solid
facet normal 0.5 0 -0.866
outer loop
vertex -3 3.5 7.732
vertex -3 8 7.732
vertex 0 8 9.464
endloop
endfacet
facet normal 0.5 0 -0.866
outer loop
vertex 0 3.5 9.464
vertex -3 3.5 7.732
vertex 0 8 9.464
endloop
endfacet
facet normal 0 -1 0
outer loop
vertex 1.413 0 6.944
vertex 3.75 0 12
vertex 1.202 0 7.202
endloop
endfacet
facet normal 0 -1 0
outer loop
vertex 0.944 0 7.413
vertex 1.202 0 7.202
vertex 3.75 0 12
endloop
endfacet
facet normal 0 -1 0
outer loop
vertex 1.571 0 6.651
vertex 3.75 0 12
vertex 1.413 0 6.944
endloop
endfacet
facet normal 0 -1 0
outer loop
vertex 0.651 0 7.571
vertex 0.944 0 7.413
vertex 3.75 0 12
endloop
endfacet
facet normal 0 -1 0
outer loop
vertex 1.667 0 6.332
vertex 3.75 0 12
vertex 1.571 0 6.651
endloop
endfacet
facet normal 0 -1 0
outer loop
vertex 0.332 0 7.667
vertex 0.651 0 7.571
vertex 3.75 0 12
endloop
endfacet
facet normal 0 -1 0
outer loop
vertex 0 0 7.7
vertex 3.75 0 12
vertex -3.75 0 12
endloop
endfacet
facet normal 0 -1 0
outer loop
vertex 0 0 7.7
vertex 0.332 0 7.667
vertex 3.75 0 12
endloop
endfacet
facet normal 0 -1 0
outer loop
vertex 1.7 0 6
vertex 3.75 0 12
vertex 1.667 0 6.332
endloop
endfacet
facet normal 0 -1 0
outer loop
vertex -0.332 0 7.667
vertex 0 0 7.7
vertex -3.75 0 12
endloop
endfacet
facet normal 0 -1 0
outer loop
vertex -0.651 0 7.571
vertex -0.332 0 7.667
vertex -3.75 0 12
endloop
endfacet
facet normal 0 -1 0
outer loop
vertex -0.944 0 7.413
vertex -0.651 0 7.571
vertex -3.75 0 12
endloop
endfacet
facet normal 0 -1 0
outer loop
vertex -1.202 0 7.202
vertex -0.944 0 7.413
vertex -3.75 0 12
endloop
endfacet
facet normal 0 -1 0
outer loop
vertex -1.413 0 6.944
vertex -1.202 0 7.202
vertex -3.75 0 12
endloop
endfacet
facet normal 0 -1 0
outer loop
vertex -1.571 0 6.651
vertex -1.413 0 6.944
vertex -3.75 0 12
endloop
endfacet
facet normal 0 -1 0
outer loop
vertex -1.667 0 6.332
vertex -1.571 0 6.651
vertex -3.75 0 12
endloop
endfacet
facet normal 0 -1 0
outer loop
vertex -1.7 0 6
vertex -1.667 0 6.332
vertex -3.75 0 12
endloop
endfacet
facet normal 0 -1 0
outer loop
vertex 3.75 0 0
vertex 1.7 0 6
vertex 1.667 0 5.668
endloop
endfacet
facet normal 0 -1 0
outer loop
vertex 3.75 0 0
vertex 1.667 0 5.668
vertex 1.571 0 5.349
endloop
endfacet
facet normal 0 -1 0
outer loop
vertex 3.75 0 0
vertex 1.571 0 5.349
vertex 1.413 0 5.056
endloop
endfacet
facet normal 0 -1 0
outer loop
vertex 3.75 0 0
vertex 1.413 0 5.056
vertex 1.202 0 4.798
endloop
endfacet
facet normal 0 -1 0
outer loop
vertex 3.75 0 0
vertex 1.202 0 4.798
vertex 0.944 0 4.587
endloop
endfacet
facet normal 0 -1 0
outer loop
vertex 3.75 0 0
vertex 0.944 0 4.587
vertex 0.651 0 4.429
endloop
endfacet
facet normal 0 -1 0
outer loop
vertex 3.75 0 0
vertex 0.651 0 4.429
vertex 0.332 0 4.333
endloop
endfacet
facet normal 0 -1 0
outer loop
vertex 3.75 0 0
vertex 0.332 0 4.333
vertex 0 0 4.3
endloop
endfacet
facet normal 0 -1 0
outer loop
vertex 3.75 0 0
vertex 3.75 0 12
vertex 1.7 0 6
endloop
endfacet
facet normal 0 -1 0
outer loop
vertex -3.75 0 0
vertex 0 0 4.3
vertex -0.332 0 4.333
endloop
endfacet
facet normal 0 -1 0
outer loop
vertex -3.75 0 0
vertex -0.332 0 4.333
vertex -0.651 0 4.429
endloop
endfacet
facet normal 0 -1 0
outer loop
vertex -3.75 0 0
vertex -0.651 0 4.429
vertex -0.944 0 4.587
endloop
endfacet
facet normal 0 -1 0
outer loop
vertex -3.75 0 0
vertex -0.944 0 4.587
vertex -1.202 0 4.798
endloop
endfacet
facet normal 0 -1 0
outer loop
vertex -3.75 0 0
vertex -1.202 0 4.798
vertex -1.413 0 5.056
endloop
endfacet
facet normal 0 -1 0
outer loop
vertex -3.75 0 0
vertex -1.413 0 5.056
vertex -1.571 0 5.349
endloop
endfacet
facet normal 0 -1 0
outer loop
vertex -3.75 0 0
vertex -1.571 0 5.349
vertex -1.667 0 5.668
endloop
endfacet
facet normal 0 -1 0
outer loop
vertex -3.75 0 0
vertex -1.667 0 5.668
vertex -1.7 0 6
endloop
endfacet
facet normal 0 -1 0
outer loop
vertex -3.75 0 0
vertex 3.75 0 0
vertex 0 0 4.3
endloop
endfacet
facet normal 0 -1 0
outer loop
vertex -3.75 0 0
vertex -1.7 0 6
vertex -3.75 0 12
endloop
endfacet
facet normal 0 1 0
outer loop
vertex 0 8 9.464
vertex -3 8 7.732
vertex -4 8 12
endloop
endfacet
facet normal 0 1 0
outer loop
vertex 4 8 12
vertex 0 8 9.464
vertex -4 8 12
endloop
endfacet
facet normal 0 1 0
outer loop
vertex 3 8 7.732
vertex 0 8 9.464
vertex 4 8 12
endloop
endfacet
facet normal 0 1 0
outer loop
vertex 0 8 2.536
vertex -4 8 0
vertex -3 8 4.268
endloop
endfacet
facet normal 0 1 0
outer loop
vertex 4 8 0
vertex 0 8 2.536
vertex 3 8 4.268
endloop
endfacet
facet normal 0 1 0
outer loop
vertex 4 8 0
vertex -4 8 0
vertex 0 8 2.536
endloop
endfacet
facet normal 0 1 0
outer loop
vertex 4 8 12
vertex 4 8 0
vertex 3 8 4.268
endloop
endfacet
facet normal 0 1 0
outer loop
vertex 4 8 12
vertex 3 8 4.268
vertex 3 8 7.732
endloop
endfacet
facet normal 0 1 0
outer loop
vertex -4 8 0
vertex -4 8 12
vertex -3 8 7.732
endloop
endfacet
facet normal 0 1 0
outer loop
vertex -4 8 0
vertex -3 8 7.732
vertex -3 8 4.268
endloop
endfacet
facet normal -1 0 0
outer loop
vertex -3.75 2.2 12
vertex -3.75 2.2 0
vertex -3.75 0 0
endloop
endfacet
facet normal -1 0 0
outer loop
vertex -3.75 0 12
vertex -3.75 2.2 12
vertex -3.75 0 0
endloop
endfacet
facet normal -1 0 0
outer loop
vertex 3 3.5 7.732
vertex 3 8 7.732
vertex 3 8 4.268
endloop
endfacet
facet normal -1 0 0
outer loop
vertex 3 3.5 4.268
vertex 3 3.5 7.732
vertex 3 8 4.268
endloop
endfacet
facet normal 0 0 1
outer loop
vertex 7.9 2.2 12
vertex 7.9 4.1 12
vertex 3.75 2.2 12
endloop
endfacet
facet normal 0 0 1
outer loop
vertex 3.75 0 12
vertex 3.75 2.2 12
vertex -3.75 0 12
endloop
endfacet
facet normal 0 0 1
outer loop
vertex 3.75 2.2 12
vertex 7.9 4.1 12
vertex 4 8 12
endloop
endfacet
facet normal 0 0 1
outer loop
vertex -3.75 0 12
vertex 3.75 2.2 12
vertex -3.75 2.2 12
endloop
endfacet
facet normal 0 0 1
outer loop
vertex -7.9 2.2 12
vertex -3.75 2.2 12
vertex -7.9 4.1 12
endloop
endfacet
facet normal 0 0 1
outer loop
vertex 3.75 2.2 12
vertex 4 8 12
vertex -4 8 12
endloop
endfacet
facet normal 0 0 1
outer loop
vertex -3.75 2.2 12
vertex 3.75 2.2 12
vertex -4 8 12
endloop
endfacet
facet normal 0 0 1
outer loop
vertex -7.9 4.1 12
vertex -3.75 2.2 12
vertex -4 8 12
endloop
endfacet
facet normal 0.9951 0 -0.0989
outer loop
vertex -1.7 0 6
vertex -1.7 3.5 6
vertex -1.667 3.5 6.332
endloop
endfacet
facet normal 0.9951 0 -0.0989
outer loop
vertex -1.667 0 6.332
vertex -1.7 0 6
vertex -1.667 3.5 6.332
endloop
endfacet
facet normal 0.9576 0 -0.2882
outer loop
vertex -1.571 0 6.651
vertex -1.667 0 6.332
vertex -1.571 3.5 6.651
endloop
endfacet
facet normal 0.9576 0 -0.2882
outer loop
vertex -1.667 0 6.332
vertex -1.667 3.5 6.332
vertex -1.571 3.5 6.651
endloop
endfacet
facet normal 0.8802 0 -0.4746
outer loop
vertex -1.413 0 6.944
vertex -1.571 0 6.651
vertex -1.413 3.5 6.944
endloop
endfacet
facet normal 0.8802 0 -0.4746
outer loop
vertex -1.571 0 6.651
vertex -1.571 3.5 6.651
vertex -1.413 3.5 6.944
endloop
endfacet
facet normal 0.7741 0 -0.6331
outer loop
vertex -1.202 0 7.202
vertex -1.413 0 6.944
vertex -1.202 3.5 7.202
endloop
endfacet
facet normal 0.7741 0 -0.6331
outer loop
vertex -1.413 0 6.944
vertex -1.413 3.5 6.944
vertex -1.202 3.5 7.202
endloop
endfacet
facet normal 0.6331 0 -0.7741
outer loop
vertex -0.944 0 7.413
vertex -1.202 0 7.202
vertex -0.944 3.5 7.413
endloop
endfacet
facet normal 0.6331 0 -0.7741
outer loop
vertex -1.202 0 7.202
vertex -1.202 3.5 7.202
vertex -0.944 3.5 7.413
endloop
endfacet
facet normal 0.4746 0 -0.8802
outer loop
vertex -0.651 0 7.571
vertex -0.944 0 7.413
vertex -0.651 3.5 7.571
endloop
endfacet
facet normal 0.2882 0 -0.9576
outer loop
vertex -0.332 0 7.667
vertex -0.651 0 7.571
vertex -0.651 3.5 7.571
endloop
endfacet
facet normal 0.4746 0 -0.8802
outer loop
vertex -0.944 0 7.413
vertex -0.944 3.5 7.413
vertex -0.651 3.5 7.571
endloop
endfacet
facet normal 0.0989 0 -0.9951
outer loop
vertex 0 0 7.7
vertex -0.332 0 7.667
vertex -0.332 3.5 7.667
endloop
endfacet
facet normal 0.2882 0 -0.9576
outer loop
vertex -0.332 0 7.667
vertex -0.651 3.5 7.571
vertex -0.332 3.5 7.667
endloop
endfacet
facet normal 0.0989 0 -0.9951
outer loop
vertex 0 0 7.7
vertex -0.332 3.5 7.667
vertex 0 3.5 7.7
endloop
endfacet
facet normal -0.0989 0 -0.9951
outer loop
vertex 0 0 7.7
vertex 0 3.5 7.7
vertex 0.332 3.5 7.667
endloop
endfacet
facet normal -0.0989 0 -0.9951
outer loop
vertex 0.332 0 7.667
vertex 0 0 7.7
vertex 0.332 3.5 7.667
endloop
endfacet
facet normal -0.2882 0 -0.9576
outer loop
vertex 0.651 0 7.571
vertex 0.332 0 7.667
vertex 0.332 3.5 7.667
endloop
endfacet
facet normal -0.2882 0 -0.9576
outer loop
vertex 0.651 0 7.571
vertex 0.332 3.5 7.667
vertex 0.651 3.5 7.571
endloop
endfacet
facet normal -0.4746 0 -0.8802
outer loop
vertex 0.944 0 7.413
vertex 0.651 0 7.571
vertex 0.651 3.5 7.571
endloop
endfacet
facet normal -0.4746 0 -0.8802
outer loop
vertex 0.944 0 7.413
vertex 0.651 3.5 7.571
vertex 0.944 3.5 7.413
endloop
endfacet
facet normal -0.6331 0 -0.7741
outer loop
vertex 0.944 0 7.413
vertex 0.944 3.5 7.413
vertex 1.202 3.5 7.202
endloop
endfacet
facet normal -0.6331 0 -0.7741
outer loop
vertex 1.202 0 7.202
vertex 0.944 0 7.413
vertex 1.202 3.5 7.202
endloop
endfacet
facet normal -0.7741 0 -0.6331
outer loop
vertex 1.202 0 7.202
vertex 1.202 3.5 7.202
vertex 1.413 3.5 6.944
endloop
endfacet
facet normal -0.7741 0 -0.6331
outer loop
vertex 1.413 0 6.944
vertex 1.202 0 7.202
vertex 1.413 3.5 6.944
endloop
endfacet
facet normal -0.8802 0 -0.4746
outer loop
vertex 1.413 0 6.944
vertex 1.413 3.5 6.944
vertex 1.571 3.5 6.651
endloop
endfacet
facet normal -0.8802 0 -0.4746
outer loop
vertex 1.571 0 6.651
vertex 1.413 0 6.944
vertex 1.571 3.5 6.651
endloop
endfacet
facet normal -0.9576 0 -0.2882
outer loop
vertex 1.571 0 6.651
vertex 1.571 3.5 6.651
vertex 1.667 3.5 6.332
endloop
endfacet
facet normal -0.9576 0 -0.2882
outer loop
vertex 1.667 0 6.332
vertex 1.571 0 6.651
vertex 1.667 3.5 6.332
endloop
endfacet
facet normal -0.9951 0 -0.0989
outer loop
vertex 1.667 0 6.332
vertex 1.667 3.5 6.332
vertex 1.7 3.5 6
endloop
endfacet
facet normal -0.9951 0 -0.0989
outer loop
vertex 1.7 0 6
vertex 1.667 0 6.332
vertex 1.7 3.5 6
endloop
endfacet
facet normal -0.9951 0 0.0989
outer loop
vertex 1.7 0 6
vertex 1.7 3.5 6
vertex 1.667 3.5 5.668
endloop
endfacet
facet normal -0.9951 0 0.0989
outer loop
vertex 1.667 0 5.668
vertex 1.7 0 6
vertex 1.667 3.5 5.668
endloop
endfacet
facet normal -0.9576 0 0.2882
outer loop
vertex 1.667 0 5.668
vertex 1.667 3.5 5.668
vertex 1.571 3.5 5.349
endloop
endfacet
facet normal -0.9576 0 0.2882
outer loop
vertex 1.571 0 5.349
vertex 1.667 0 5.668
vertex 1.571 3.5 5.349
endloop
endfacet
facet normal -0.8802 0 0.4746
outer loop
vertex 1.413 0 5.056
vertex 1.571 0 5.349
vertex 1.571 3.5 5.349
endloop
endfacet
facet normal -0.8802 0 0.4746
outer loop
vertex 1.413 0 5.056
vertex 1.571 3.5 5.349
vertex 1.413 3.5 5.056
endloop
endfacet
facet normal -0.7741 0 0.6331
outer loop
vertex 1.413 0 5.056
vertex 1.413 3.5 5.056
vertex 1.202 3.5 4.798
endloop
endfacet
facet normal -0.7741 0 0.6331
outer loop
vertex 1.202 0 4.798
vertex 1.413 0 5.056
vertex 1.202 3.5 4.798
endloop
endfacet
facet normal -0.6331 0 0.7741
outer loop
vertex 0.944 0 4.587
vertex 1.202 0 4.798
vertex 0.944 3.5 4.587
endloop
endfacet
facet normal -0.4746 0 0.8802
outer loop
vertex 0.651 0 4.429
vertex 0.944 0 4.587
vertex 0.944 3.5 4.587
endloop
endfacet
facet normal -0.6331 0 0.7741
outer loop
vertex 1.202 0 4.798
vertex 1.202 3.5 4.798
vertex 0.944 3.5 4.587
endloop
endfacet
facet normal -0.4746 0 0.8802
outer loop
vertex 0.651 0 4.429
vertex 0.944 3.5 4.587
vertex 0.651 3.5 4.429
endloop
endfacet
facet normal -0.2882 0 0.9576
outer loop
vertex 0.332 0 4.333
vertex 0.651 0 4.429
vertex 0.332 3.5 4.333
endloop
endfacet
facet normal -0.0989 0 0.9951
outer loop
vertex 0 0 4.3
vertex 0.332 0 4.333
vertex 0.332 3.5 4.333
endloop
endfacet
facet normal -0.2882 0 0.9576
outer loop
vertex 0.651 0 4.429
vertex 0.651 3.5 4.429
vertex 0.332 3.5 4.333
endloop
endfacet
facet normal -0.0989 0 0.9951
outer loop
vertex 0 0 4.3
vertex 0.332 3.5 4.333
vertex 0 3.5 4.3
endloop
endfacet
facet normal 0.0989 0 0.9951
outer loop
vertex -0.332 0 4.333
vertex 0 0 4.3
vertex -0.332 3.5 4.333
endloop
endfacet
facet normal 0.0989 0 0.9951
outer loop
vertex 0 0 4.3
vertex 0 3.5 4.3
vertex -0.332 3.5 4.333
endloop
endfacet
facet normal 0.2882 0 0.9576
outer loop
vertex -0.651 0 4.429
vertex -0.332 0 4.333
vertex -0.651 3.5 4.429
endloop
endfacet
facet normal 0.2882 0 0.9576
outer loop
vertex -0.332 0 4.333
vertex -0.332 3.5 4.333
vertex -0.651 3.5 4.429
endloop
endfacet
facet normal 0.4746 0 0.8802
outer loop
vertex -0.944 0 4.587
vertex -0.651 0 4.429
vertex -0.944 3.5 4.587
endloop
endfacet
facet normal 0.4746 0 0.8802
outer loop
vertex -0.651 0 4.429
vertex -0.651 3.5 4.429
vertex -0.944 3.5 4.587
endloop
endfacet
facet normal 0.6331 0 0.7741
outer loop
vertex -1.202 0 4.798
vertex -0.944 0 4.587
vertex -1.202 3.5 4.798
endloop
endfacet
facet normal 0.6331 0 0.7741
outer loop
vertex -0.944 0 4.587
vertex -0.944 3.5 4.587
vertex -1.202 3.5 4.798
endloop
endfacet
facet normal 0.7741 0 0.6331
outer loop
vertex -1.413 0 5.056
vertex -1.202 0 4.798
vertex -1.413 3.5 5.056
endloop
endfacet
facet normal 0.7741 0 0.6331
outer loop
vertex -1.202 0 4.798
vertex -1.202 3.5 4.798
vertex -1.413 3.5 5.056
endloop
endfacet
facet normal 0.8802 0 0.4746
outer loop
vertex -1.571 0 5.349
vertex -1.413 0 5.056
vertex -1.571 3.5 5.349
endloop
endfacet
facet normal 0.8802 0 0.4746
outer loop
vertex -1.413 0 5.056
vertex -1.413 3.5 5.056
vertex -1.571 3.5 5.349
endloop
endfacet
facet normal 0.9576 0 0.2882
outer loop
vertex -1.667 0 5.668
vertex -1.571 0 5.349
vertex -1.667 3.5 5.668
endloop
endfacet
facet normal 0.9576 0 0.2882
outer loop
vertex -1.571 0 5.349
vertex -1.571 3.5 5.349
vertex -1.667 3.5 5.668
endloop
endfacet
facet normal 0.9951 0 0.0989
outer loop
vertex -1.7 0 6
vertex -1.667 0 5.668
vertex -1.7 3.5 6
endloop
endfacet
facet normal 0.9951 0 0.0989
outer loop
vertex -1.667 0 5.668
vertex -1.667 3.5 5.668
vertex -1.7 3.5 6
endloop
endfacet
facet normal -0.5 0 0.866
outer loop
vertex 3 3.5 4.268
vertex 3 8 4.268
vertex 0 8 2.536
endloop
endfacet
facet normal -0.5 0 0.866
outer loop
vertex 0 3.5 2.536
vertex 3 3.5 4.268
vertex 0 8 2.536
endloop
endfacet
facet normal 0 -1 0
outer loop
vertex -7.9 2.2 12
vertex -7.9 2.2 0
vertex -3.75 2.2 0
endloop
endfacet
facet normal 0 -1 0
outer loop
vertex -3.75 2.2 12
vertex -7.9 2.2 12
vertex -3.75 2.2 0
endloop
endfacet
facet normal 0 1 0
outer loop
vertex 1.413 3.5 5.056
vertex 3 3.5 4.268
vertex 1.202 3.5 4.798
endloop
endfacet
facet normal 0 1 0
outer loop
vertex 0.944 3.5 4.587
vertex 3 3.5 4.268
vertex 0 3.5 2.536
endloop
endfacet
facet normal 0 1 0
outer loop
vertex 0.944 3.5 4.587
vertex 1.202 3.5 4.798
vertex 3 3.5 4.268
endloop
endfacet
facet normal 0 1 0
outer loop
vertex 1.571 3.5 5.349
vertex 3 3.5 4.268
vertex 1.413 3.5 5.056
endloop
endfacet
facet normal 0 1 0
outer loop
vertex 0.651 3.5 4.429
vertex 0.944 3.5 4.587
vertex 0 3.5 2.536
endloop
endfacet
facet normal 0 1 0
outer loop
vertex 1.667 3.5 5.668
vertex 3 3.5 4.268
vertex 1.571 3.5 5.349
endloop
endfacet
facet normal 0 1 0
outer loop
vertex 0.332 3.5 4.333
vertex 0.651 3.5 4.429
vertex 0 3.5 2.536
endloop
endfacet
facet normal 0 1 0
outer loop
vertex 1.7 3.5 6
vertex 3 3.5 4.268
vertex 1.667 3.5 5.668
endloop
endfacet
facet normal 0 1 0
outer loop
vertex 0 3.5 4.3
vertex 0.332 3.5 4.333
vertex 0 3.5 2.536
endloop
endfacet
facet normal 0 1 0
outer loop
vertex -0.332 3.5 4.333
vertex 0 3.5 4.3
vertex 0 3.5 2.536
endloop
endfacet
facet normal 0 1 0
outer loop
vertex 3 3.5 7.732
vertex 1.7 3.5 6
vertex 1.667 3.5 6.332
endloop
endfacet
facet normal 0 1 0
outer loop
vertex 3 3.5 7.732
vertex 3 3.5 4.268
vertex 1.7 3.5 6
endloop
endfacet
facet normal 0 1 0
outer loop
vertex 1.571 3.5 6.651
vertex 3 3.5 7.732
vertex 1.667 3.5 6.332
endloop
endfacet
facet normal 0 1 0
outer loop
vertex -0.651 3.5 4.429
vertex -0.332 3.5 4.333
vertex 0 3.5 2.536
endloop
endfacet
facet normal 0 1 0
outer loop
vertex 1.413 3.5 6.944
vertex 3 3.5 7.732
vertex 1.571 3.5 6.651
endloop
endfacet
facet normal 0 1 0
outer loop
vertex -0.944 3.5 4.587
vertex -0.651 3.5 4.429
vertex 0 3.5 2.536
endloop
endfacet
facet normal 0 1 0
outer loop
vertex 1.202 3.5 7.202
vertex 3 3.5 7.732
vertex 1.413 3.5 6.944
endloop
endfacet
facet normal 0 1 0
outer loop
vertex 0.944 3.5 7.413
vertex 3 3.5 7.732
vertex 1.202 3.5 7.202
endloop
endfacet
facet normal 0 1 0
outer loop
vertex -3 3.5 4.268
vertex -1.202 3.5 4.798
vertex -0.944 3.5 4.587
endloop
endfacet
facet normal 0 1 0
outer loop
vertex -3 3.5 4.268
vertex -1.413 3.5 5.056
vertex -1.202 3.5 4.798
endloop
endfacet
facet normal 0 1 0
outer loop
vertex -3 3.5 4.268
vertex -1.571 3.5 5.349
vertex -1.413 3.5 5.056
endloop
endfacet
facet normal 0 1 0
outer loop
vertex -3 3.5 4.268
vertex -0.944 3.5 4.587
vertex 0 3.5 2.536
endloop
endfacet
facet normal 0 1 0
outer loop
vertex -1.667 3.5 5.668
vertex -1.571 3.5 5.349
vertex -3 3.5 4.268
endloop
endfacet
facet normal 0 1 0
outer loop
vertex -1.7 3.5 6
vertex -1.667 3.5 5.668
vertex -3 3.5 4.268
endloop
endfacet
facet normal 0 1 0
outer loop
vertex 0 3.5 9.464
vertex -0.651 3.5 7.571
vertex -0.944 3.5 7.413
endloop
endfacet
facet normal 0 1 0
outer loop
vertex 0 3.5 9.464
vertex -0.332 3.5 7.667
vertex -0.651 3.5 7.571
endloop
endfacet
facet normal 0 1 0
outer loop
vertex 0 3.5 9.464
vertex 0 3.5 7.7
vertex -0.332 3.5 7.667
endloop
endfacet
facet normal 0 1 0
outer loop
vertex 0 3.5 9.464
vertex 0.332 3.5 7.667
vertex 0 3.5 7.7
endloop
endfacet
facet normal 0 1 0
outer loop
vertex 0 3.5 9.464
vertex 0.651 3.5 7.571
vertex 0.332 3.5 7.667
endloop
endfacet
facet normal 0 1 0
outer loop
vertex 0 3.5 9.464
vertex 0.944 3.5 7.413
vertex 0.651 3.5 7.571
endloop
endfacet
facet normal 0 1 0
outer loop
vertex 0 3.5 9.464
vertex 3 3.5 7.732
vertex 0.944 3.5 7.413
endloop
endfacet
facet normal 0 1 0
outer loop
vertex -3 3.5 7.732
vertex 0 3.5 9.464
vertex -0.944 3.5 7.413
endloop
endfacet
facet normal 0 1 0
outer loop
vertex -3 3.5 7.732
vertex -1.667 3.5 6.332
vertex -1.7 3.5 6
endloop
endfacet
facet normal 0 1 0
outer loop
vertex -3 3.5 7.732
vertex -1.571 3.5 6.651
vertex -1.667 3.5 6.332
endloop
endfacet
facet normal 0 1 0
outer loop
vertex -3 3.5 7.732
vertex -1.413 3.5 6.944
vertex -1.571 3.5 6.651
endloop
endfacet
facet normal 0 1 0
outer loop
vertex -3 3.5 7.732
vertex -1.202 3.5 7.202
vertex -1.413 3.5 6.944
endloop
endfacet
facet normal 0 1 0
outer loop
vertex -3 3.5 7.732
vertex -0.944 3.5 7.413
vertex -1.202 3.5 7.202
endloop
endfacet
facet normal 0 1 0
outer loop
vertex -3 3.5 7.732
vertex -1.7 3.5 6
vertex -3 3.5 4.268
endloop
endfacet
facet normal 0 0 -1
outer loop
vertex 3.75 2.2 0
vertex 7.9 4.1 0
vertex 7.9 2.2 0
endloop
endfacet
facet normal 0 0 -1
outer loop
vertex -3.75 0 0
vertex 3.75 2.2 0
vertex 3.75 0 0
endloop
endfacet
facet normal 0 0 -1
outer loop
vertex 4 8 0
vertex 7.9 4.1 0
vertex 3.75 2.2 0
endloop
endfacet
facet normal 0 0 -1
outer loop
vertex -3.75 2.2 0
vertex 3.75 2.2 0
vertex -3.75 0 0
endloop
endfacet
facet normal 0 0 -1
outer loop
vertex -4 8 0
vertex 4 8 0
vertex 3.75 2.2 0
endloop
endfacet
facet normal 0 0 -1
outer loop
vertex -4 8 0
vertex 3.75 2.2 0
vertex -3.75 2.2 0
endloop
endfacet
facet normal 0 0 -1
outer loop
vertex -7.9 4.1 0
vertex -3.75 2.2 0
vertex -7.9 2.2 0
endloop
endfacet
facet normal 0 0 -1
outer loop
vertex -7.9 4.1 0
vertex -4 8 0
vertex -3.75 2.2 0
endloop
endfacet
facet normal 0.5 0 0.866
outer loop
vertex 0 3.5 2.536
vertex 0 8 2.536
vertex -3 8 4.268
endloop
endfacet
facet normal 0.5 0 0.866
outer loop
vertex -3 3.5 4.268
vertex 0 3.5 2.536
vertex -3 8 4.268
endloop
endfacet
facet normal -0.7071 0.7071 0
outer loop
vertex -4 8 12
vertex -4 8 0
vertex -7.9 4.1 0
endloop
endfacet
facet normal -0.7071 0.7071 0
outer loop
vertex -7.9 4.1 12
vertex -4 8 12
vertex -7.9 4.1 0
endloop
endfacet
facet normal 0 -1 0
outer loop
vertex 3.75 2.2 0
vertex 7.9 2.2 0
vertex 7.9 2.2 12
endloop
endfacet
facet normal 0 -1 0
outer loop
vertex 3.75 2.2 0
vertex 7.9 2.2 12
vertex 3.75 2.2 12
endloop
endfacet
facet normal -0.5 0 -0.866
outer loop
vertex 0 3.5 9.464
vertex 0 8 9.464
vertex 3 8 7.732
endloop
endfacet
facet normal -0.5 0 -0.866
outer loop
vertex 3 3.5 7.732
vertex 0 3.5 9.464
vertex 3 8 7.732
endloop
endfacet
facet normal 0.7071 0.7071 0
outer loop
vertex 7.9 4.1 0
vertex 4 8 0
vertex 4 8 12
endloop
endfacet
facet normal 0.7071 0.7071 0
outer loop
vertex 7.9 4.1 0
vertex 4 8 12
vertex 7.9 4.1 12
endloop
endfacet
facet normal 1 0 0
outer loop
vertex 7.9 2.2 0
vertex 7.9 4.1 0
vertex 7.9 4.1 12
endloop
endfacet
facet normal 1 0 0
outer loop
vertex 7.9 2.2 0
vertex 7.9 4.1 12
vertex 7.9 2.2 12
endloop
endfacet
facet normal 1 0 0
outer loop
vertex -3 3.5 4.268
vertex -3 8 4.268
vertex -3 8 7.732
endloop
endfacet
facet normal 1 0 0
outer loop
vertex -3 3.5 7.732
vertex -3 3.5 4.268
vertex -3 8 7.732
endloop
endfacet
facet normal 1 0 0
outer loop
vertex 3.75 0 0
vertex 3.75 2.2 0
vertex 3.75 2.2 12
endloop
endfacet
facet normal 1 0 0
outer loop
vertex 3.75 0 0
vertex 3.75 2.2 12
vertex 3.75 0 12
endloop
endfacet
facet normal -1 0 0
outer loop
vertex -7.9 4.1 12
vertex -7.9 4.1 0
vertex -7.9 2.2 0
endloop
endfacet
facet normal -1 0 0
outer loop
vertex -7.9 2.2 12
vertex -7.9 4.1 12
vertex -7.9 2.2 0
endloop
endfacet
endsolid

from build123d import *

# Parameters (mm, degrees)
PAD005_DEPTH    = 12
POCKET003_DEPTH = 4.5
SKETCH012_R     = 1.7
HOLE003_DEPTH   = 25


with BuildPart() as part:
    # Sketch010 → Pad005 (new body)
    with BuildSketch(Plane.XY):
        Polygon((0, 0), (0, 8), (-4, 8), (-7.9, 4.1), (-7.9, 2.2), (-3.75, 2.2), (-3.75, 0), align=None)
    pad005 = extrude(amount=PAD005_DEPTH)

    # Mirrored003: Pad005 across Sketch010 V_Axis
    add(pad005.mirror(Plane(origin=(0, 0, 0), x_dir=(0, 0, 1), z_dir=(1, 0, 0))))

    # Sketch011 (on DatumPlane) → Pocket003 (cut)
    with BuildSketch(Plane(origin=(0, 8, 0), x_dir=(-1, 0, 0), z_dir=(0, 1, 0))):
        Polygon((0, 2.535898), (3, 4.267949), (3, 7.732051), (0, 9.464102), (-3, 7.732051), (-3, 4.267949), align=None)
    extrude(amount=-POCKET003_DEPTH, mode=Mode.SUBTRACT)

    # Sketch012 (on DatumPlane) → Hole003 (cut)
    with BuildSketch(Plane(origin=(0, 8, 0), x_dir=(-1, 0, 0), z_dir=(0, 1, 0))):
        with Locations((0, 6)):
            Circle(SKETCH012_R)
    extrude(amount=-HOLE003_DEPTH, mode=Mode.SUBTRACT)


solid = part.part
